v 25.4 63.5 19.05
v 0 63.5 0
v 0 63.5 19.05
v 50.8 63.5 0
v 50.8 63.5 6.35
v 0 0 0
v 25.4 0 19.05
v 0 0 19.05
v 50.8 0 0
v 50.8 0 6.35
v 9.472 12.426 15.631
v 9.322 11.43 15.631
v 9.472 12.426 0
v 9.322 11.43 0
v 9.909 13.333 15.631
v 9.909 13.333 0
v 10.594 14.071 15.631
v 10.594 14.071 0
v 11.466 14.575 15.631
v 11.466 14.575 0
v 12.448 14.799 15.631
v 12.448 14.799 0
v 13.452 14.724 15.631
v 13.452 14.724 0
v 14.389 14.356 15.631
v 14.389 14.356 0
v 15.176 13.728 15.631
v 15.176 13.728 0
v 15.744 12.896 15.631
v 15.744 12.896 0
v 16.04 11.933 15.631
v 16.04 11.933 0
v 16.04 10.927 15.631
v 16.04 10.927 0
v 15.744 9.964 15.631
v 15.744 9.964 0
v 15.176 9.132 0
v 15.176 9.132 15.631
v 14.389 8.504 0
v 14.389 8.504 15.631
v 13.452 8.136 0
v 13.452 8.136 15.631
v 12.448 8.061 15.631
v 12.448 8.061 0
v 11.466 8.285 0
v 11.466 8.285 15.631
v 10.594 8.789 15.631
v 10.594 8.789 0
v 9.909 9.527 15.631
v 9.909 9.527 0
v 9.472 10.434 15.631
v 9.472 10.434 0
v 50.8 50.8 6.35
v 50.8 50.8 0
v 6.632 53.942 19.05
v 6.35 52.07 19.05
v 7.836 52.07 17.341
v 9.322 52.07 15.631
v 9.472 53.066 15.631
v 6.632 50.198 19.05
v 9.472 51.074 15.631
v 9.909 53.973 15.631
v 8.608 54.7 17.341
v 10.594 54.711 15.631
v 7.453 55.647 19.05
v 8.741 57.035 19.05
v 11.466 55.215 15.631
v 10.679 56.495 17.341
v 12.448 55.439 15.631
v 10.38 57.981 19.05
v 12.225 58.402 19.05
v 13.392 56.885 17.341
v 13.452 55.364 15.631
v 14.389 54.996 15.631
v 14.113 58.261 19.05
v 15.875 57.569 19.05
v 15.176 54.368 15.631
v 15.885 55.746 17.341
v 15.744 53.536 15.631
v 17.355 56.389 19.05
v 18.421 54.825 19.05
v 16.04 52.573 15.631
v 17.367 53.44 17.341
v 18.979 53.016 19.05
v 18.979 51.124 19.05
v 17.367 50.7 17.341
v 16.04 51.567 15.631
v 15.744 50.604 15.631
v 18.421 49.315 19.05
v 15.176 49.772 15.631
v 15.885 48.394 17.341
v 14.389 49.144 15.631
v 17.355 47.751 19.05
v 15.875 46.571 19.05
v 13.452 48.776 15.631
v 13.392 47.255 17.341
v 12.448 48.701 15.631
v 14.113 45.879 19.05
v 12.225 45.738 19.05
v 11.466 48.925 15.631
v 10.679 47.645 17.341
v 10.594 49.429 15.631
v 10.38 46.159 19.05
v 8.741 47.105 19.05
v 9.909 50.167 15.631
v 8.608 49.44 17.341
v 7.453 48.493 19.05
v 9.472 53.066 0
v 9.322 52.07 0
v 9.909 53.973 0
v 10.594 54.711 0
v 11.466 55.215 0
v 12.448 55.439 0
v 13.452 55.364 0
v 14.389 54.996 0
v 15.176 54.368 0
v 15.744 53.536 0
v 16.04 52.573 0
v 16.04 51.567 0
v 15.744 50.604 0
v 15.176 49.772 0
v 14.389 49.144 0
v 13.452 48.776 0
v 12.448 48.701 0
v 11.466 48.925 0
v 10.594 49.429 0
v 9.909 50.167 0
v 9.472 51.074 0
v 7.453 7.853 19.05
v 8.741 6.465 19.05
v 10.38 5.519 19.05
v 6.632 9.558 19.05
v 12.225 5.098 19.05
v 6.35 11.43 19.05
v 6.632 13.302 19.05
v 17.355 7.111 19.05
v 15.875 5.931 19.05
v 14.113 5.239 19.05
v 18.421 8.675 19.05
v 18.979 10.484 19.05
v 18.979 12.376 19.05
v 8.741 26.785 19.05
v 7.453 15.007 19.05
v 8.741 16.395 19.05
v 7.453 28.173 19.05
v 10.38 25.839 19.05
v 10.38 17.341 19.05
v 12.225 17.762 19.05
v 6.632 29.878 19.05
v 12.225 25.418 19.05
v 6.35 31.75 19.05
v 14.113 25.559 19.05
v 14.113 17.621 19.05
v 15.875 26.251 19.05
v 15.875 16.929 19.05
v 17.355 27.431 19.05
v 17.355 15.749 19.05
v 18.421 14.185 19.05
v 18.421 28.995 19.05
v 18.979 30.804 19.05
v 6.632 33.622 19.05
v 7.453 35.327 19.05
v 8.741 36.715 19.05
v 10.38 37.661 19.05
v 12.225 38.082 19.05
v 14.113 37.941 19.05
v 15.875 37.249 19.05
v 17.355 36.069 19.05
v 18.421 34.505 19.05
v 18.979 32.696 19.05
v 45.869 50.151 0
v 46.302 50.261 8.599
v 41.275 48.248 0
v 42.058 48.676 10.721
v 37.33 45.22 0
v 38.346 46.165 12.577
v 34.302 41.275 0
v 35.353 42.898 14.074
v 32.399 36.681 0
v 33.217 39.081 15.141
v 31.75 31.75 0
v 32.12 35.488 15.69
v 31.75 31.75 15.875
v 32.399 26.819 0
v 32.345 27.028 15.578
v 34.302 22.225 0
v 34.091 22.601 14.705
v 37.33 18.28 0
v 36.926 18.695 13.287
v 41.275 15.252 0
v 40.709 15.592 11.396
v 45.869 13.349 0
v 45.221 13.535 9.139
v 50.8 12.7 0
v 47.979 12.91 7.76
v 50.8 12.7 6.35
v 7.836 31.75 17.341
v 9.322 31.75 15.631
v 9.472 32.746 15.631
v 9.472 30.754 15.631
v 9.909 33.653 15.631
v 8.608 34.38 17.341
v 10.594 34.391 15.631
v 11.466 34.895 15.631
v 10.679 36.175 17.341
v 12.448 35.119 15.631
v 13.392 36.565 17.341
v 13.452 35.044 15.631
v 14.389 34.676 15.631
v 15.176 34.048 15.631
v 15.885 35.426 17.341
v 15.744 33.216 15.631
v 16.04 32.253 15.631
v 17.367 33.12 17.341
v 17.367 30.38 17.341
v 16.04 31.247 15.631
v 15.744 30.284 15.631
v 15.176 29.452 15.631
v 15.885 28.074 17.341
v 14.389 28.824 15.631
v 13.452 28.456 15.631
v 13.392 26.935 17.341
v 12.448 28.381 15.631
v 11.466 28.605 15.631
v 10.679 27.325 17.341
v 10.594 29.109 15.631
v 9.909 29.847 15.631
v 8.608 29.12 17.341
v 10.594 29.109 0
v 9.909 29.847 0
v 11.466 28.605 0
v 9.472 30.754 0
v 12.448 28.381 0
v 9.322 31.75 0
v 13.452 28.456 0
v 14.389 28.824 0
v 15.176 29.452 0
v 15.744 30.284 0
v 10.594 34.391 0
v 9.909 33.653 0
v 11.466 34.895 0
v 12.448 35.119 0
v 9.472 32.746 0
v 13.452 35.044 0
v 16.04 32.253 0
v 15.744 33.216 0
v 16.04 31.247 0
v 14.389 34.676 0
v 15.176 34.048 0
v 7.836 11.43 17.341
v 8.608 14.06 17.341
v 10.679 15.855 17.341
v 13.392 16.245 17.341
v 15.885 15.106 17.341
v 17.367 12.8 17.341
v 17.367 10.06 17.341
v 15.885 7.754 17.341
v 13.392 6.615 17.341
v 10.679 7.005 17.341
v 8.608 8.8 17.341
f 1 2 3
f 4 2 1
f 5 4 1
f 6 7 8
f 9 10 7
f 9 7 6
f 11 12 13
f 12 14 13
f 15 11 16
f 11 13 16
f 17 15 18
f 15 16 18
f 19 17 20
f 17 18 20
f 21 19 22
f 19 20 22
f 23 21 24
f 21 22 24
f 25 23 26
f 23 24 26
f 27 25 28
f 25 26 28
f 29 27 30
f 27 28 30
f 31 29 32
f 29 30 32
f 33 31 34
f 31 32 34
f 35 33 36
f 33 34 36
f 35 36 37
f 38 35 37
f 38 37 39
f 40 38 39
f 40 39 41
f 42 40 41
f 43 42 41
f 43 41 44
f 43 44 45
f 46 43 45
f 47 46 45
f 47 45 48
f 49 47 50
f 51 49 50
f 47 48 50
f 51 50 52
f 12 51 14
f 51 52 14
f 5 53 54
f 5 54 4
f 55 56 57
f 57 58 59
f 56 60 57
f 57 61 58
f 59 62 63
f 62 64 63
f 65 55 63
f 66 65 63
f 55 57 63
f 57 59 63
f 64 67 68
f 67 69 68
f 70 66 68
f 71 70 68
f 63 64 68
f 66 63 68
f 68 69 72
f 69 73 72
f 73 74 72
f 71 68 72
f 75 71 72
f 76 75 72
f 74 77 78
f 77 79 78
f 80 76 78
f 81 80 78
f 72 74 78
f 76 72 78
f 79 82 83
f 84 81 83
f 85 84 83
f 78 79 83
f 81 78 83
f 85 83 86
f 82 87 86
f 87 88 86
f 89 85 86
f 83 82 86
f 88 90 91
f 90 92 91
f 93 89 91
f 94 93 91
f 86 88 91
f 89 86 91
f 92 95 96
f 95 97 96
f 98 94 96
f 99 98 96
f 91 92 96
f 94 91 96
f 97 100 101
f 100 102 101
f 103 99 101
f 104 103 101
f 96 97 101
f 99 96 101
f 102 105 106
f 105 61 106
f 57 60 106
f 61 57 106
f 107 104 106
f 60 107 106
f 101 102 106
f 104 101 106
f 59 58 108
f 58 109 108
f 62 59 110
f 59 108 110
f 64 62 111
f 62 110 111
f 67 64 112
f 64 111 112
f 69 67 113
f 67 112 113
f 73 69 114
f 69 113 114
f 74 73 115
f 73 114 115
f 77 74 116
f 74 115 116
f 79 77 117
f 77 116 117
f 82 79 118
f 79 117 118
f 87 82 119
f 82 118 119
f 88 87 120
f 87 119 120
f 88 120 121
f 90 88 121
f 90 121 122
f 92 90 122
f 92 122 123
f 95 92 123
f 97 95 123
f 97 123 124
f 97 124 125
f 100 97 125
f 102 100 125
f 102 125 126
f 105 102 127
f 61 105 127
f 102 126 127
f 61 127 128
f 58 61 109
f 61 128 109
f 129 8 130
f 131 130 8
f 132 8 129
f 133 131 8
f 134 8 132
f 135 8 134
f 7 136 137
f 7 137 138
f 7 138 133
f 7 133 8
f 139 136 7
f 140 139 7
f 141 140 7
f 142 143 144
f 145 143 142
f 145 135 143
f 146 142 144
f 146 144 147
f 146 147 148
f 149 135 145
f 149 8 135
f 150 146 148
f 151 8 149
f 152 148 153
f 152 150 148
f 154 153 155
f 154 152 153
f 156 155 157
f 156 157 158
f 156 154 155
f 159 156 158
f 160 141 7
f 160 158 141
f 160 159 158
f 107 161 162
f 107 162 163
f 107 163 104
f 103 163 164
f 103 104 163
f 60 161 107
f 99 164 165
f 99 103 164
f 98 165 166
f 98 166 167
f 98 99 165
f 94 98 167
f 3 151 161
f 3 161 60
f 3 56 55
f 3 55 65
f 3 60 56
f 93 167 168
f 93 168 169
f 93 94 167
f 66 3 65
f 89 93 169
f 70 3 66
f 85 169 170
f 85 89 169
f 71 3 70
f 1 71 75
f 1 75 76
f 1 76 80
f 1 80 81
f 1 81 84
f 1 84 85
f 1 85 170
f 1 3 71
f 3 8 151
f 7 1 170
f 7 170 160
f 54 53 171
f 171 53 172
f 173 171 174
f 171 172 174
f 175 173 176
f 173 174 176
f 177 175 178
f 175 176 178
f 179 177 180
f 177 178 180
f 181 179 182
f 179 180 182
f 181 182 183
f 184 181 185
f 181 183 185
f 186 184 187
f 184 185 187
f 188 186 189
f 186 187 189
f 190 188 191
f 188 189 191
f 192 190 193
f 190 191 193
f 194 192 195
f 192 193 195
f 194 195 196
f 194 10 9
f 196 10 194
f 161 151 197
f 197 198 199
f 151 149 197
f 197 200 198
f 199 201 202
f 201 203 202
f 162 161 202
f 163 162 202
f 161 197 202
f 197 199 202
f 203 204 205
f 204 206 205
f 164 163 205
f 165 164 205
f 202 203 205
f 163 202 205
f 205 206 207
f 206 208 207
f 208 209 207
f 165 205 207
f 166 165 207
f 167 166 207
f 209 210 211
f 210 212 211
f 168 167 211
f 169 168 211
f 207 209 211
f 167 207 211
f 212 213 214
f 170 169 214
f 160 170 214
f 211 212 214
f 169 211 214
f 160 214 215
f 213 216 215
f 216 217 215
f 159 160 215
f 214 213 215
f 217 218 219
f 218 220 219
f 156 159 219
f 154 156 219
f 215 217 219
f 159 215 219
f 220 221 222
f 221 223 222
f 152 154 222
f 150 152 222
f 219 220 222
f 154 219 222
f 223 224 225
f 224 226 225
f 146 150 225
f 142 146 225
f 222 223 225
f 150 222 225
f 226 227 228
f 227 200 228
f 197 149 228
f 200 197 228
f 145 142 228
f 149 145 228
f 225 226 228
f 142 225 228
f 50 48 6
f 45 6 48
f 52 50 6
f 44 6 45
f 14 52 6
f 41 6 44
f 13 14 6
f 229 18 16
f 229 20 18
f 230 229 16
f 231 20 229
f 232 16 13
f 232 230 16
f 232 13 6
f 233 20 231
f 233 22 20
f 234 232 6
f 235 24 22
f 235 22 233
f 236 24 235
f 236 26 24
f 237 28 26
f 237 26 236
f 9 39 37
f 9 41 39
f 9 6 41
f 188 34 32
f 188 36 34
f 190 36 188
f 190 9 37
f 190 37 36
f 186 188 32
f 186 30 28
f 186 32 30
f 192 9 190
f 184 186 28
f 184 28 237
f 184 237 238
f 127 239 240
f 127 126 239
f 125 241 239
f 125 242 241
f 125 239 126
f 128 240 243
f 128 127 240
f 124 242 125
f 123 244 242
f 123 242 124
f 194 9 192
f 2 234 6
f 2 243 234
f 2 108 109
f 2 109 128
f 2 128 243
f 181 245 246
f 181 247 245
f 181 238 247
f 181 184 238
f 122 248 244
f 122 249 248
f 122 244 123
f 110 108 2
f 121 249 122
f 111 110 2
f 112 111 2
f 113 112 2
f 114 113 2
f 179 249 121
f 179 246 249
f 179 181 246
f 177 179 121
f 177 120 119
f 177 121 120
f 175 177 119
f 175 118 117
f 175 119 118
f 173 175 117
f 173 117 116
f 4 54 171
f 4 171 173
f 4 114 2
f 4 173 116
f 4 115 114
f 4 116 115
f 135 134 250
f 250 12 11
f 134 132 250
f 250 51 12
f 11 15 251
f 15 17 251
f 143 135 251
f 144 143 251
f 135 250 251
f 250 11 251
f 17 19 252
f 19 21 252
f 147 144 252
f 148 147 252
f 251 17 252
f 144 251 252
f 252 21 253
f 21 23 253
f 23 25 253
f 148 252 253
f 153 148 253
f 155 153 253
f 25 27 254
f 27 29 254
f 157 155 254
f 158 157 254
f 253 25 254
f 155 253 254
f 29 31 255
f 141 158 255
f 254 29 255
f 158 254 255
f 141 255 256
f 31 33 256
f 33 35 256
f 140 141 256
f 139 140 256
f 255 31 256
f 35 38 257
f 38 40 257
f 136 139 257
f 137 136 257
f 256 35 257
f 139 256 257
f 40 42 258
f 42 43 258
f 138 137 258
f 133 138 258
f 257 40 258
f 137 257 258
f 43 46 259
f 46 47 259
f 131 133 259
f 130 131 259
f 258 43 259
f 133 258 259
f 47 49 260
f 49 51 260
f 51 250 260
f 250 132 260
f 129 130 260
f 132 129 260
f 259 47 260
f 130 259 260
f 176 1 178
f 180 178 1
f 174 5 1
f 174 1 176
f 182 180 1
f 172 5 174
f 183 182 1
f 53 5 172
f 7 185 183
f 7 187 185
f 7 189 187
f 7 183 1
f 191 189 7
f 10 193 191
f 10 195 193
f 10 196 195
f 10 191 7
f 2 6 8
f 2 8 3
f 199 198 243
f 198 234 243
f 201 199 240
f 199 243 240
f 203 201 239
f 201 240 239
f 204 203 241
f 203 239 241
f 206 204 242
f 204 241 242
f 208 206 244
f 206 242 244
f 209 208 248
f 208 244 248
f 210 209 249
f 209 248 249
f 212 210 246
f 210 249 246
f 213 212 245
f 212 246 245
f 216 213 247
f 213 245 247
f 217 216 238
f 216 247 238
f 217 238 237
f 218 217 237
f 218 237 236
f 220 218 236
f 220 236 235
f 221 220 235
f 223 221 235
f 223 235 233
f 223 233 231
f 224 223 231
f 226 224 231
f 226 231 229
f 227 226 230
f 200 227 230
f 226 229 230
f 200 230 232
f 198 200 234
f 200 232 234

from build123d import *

# Parameters (mm, degrees)
F0_W           = 25.4
F0_H           = 63.5
F1_DEPTH       = 19.05
F1_FACE_W      = 63.5
F1_FACE_H      = 19.05
F3_W           = 63.5
F3_H           = 6.35
F5_D           = 38.1
F8_D           = 6.7564
F8_CSINK_D     = 12.7
F8_CSINK_ANGLE = 82


with BuildPart() as f1:
    # F0 (on Top) → F1 (new body)
    with BuildSketch(Plane.XY):
        with Locations((12.7, 31.75)):
            Rectangle(F0_W, F0_H)
    extrude(amount=F1_DEPTH)

    # F1_face (on face) → F4 section 0
    with BuildSketch(Plane(origin=(25.4, 31.75, 9.525), x_dir=(0, 1, 0), z_dir=(1, 0, 0))):
        Rectangle(F1_FACE_W, F1_FACE_H)
    # F3 (on offset) → F4 section 1
    with BuildSketch(Plane.YZ.offset(50.8)):
        with Locations((31.75, 3.175)):
            Rectangle(F3_W, F3_H)
    loft()

    # F5 (through all)
    with Locations(Plane(origin=(0, 0, 0), x_dir=(1, 0, 0), z_dir=(0, 0, -1))):
        with Locations((50.8, -31.75)):
            Hole(F5_D / 2)

    # F8 (through all)
    with Locations(Plane.XY.offset(19.05)):
        with Locations((12.7, 52.07), (12.7, 31.75), (12.7, 11.43)):
            CounterSinkHole(F8_D / 2, F8_CSINK_D / 2, counter_sink_angle=F8_CSINK_ANGLE)


solid = f1.part
